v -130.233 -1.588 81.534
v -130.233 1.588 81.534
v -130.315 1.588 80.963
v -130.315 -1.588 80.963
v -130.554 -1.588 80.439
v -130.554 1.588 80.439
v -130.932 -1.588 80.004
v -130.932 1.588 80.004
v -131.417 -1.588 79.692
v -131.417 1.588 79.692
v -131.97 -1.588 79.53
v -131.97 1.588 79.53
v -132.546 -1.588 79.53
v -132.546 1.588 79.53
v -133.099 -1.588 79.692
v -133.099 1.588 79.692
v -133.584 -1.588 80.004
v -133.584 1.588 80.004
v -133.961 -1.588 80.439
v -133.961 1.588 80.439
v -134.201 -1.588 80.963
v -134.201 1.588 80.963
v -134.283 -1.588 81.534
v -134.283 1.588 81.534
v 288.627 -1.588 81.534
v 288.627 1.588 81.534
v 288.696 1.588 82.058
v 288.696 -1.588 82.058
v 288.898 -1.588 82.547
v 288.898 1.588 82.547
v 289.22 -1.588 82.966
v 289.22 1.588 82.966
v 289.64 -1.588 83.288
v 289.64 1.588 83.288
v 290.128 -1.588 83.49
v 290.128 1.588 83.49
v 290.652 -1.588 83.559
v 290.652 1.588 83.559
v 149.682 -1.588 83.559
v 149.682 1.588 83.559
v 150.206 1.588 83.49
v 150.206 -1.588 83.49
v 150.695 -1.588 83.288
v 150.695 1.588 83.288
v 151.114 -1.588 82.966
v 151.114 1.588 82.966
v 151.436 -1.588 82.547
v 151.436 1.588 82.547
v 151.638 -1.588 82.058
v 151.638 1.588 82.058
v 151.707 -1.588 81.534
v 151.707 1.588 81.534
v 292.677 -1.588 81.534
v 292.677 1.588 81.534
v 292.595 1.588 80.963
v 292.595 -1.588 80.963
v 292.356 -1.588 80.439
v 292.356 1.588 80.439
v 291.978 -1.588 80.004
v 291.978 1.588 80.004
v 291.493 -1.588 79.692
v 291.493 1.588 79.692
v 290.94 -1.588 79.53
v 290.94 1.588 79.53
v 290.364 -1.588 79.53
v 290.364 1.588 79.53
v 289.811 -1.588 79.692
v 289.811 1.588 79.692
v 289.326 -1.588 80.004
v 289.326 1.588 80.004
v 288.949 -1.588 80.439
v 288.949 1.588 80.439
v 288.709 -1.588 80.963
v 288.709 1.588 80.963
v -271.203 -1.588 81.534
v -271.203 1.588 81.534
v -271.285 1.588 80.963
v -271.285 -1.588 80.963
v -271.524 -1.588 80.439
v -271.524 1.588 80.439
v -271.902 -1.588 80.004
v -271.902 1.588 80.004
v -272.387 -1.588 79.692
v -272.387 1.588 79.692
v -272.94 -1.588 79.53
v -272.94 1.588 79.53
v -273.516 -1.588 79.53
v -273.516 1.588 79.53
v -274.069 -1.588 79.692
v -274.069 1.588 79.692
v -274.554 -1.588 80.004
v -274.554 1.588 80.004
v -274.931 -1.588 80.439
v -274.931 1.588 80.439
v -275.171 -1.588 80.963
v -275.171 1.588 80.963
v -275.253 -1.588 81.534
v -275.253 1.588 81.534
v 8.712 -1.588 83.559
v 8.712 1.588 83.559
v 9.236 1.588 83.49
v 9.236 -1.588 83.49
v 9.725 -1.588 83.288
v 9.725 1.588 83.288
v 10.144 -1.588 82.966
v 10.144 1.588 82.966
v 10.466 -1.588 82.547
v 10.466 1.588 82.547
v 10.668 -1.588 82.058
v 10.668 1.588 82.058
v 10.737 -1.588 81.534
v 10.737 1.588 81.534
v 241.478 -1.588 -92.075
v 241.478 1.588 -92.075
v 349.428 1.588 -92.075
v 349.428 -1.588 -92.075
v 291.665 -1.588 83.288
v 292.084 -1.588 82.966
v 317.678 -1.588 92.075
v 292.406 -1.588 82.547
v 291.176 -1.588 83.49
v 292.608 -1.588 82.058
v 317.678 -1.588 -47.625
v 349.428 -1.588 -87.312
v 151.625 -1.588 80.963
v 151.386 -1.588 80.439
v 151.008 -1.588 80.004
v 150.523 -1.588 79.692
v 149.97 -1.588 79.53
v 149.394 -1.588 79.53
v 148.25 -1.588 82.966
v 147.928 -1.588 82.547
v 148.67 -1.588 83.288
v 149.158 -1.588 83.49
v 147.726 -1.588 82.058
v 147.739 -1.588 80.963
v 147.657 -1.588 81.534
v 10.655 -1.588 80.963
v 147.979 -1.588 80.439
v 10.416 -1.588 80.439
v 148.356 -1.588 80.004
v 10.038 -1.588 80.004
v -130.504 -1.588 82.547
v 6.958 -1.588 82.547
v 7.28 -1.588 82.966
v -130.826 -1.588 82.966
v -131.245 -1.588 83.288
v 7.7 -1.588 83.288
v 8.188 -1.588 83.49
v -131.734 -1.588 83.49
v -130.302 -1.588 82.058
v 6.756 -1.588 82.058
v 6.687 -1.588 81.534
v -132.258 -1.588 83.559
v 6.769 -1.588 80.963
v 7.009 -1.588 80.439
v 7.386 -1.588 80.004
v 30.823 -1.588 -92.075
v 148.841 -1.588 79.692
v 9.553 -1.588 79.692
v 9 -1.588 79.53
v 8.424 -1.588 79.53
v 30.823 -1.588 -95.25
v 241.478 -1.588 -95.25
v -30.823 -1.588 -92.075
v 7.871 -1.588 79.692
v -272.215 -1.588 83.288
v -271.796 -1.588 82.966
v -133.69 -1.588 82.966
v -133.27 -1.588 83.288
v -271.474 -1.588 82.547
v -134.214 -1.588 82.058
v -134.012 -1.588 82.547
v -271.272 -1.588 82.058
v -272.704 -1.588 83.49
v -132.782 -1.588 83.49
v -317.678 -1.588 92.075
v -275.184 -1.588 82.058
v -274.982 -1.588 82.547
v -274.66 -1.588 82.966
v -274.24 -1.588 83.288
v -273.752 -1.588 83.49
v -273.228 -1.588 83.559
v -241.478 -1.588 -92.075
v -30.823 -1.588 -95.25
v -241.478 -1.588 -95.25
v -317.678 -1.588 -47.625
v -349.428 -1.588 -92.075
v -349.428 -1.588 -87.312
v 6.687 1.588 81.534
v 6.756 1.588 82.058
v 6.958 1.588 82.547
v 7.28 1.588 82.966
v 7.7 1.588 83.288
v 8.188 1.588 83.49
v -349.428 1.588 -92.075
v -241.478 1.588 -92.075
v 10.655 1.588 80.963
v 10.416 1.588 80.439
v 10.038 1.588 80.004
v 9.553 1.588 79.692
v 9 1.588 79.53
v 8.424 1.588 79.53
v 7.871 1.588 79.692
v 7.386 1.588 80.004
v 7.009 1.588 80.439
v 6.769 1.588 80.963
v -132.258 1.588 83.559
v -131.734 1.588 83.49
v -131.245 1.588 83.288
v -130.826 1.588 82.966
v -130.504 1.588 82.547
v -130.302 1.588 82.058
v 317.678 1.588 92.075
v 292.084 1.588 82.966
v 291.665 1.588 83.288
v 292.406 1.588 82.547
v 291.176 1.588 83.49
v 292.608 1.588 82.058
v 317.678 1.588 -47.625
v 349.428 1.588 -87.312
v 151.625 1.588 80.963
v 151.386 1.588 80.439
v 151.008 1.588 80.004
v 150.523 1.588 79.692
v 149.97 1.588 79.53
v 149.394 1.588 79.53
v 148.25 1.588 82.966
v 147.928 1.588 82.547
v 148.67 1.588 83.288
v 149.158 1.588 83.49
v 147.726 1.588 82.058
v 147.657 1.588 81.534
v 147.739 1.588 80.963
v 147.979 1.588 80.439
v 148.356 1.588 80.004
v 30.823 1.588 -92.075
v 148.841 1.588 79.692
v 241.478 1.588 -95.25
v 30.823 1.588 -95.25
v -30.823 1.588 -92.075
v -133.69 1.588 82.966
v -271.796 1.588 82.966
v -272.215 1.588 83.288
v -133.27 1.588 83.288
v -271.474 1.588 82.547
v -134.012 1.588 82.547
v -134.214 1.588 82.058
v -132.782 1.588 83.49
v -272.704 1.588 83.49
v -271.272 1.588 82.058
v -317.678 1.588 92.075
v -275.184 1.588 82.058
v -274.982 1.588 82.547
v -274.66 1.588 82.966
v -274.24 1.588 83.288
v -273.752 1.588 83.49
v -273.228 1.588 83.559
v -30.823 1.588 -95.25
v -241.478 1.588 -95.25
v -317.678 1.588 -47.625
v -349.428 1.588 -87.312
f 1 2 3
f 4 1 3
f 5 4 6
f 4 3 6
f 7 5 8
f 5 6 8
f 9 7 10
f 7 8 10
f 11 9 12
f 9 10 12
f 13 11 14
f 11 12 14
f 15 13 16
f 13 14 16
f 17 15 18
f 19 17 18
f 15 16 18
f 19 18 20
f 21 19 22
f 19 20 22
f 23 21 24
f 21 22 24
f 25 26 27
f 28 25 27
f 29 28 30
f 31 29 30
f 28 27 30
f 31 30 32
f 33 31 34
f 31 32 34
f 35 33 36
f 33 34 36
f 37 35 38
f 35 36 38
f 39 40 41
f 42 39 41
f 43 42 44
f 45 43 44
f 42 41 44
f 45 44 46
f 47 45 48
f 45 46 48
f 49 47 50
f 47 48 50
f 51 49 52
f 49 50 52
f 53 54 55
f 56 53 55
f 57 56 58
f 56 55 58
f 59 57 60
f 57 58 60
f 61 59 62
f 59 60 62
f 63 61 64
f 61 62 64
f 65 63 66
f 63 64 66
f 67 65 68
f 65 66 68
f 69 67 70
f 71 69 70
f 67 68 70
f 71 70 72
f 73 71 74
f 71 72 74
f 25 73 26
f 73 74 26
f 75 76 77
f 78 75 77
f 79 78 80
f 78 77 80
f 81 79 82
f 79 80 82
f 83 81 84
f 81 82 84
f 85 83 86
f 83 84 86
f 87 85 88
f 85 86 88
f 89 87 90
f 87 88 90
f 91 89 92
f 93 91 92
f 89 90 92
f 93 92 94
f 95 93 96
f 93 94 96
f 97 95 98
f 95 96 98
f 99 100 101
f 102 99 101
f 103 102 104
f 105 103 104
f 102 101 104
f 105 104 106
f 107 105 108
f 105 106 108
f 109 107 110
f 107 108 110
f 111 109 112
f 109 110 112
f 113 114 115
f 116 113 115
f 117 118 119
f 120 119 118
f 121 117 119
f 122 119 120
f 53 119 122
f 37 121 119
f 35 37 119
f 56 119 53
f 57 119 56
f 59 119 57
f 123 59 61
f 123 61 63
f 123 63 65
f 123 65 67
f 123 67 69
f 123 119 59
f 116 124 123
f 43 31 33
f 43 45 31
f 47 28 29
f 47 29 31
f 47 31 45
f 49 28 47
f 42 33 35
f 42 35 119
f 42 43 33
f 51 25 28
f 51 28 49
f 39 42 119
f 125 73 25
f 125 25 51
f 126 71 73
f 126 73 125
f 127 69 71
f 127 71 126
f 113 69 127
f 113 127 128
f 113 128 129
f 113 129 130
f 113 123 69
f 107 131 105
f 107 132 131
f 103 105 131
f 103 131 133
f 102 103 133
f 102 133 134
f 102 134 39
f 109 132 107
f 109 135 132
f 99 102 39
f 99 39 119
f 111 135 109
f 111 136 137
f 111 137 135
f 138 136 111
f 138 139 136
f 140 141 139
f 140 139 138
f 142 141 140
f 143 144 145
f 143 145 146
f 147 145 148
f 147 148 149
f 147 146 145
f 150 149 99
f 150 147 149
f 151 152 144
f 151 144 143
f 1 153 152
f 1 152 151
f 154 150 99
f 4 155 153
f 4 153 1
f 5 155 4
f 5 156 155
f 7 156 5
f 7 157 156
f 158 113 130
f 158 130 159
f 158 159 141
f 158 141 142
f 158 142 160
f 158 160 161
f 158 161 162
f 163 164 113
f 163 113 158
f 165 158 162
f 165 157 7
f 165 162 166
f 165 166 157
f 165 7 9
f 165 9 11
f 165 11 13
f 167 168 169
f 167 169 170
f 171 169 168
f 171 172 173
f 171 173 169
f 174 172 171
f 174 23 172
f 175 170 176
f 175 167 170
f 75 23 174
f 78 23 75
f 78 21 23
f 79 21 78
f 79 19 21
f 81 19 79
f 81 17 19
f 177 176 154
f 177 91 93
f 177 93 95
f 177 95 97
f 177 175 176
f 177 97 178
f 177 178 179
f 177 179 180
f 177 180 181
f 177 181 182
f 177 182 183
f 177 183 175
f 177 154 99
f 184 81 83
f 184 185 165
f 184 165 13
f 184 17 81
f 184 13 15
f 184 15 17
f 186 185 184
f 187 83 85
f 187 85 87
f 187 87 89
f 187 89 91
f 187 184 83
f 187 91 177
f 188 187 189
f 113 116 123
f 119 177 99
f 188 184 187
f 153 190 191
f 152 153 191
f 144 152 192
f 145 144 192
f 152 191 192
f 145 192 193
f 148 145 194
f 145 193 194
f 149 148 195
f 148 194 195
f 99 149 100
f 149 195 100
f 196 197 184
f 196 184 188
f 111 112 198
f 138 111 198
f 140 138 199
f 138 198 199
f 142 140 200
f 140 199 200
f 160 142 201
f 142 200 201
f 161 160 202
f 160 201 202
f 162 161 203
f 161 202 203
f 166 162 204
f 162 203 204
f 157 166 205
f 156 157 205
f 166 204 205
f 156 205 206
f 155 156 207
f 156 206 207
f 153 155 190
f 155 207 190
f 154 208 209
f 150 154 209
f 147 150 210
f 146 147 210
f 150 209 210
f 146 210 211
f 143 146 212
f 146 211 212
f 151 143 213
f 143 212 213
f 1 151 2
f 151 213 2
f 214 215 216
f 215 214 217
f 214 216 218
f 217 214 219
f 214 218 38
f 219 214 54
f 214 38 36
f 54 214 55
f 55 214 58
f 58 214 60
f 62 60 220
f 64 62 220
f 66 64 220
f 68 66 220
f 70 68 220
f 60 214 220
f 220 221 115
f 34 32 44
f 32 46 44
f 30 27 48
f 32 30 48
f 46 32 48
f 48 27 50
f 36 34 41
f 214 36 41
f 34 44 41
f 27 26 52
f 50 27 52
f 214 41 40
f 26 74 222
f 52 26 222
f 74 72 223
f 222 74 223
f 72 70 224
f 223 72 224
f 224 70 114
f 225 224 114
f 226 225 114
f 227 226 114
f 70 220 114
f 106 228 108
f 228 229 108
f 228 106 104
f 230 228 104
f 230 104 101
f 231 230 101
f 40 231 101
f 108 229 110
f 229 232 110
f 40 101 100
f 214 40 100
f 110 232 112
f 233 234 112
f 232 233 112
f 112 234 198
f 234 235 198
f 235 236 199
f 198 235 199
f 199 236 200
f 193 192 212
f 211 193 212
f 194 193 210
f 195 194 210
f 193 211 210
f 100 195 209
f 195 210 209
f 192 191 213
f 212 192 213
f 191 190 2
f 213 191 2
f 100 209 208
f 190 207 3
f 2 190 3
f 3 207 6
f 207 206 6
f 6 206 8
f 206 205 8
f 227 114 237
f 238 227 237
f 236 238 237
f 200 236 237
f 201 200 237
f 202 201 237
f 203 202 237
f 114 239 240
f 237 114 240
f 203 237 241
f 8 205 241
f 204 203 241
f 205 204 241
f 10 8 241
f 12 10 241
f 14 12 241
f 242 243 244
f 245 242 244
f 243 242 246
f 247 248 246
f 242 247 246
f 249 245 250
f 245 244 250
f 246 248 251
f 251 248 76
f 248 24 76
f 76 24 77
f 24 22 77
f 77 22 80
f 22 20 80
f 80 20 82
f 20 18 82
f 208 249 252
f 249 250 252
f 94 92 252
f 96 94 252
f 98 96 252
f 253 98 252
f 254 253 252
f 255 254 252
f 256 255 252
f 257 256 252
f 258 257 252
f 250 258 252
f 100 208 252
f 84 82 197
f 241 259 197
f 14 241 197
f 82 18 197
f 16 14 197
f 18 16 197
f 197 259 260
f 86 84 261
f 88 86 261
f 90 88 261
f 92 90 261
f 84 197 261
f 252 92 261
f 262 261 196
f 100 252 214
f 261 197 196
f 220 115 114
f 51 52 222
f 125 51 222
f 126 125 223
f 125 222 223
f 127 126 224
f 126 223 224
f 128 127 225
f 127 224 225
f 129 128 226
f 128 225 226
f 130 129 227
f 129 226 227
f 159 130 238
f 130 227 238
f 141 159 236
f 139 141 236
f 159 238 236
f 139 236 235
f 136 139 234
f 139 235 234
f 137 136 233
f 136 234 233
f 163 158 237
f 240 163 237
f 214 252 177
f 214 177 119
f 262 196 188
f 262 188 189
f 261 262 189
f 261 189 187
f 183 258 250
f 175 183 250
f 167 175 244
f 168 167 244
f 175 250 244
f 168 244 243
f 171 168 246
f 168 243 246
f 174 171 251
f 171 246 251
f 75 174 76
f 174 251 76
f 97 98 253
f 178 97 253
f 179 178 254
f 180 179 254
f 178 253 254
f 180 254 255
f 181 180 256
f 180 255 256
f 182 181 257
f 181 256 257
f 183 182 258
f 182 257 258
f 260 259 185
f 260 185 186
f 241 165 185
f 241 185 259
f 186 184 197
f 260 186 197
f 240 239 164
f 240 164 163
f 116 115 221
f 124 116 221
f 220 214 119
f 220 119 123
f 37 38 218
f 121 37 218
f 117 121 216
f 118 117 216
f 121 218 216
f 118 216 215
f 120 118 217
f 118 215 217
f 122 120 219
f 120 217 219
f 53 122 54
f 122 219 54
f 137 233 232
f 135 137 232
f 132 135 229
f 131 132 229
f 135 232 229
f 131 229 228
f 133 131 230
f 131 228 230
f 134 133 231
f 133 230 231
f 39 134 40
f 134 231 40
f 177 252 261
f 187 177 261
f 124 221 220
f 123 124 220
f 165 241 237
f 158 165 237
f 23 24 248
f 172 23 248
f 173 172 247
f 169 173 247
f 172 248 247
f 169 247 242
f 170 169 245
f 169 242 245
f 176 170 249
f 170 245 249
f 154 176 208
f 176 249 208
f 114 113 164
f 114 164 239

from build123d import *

# Parameters (mm, degrees)
SKETCH1_W           = 635.3556
SKETCH1_H           = 184.15
BOSS_EXTRUDE1_DEPTH = 1.5875
SKETCH2_W           = 210.6549
SKETCH2_H           = 3.175
BOSS_EXTRUDE2_DEPTH = 3.175
BOSS_EXTRUDE3_DEPTH = 3.175
CUT_EXTRUDE1_DEPTH  = 10
LPATTERN1_COUNT     = 5
LPATTERN1_PITCH     = 140.97


with BuildPart() as part:
    # Sketch1 → Boss-Extrude1 (new, symmetric)
    with BuildSketch(Plane(origin=(0, 0, 0), x_dir=(1, 0, 0), z_dir=(0, 1, 0))):
        Rectangle(SKETCH1_W, SKETCH1_H)
    extrude(amount=BOSS_EXTRUDE1_DEPTH, both=True)

    # Sketch2 → Boss-Extrude2 (add)
    with BuildSketch(Plane(origin=(0, 0, -92.075), x_dir=(-1, 0, 0), z_dir=(0, 0, -1))):
        with Locations((-136.15035, 0)):
            Rectangle(SKETCH2_W, SKETCH2_H)
        with Locations((136.15035, 0)):
            Rectangle(SKETCH2_W, SKETCH2_H)
    extrude(amount=BOSS_EXTRUDE2_DEPTH)

    # Sketch3 → Boss-Extrude3 (add)
    with BuildSketch(Plane(origin=(0, 1.5875, 0), x_dir=(1, 0, 0), z_dir=(0, 1, 0))):
        Polygon((-317.6778, 47.625), (-317.6778, 92.075), (-349.4278, 92.075), (-349.4278, 87.3125), align=None)
    boss_extrude3 = extrude(amount=-BOSS_EXTRUDE3_DEPTH)

    # Mirror1: Boss-Extrude3 across plane
    add(boss_extrude3.mirror(Plane(origin=(0, 0, 0), x_dir=(0, 0, 1), z_dir=(1, 0, 0))))

    # Sketch4 → Cut-Extrude1 (cut)
    with BuildSketch(Plane(origin=(0, 1.5875, 0), x_dir=(1, 0, 0), z_dir=(0, 1, 0))):
        with BuildLine():
            ThreePointArc((-275.2528, -81.534), (-274.659691232, -82.965891232), (-273.2278, -83.559))
            Line((-273.2278, -83.559), (-273.2278, -81.534))
            Line((-273.2278, -81.534), (-275.2528, -81.534))
        make_face()
        with BuildLine():
            Line((-273.2278, -81.534), (-273.2278, -83.559))
            ThreePointArc((-273.2278, -83.559), (-271.795908768, -82.965891232), (-271.2028, -81.534))
            ThreePointArc((-271.2028, -81.534), (-273.2278, -79.509), (-275.2528, -81.534))
            Line((-275.2528, -81.534), (-273.2278, -81.534))
        make_face()
    cut_extrude1 = extrude(amount=-CUT_EXTRUDE1_DEPTH, mode=Mode.SUBTRACT)

    # LPattern1: Cut-Extrude1 ×5
    with Locations(*[(i * LPATTERN1_PITCH, 0, 0) for i in range(1, LPATTERN1_COUNT)]):
        add(cut_extrude1, mode=Mode.SUBTRACT)


solid = part.part
